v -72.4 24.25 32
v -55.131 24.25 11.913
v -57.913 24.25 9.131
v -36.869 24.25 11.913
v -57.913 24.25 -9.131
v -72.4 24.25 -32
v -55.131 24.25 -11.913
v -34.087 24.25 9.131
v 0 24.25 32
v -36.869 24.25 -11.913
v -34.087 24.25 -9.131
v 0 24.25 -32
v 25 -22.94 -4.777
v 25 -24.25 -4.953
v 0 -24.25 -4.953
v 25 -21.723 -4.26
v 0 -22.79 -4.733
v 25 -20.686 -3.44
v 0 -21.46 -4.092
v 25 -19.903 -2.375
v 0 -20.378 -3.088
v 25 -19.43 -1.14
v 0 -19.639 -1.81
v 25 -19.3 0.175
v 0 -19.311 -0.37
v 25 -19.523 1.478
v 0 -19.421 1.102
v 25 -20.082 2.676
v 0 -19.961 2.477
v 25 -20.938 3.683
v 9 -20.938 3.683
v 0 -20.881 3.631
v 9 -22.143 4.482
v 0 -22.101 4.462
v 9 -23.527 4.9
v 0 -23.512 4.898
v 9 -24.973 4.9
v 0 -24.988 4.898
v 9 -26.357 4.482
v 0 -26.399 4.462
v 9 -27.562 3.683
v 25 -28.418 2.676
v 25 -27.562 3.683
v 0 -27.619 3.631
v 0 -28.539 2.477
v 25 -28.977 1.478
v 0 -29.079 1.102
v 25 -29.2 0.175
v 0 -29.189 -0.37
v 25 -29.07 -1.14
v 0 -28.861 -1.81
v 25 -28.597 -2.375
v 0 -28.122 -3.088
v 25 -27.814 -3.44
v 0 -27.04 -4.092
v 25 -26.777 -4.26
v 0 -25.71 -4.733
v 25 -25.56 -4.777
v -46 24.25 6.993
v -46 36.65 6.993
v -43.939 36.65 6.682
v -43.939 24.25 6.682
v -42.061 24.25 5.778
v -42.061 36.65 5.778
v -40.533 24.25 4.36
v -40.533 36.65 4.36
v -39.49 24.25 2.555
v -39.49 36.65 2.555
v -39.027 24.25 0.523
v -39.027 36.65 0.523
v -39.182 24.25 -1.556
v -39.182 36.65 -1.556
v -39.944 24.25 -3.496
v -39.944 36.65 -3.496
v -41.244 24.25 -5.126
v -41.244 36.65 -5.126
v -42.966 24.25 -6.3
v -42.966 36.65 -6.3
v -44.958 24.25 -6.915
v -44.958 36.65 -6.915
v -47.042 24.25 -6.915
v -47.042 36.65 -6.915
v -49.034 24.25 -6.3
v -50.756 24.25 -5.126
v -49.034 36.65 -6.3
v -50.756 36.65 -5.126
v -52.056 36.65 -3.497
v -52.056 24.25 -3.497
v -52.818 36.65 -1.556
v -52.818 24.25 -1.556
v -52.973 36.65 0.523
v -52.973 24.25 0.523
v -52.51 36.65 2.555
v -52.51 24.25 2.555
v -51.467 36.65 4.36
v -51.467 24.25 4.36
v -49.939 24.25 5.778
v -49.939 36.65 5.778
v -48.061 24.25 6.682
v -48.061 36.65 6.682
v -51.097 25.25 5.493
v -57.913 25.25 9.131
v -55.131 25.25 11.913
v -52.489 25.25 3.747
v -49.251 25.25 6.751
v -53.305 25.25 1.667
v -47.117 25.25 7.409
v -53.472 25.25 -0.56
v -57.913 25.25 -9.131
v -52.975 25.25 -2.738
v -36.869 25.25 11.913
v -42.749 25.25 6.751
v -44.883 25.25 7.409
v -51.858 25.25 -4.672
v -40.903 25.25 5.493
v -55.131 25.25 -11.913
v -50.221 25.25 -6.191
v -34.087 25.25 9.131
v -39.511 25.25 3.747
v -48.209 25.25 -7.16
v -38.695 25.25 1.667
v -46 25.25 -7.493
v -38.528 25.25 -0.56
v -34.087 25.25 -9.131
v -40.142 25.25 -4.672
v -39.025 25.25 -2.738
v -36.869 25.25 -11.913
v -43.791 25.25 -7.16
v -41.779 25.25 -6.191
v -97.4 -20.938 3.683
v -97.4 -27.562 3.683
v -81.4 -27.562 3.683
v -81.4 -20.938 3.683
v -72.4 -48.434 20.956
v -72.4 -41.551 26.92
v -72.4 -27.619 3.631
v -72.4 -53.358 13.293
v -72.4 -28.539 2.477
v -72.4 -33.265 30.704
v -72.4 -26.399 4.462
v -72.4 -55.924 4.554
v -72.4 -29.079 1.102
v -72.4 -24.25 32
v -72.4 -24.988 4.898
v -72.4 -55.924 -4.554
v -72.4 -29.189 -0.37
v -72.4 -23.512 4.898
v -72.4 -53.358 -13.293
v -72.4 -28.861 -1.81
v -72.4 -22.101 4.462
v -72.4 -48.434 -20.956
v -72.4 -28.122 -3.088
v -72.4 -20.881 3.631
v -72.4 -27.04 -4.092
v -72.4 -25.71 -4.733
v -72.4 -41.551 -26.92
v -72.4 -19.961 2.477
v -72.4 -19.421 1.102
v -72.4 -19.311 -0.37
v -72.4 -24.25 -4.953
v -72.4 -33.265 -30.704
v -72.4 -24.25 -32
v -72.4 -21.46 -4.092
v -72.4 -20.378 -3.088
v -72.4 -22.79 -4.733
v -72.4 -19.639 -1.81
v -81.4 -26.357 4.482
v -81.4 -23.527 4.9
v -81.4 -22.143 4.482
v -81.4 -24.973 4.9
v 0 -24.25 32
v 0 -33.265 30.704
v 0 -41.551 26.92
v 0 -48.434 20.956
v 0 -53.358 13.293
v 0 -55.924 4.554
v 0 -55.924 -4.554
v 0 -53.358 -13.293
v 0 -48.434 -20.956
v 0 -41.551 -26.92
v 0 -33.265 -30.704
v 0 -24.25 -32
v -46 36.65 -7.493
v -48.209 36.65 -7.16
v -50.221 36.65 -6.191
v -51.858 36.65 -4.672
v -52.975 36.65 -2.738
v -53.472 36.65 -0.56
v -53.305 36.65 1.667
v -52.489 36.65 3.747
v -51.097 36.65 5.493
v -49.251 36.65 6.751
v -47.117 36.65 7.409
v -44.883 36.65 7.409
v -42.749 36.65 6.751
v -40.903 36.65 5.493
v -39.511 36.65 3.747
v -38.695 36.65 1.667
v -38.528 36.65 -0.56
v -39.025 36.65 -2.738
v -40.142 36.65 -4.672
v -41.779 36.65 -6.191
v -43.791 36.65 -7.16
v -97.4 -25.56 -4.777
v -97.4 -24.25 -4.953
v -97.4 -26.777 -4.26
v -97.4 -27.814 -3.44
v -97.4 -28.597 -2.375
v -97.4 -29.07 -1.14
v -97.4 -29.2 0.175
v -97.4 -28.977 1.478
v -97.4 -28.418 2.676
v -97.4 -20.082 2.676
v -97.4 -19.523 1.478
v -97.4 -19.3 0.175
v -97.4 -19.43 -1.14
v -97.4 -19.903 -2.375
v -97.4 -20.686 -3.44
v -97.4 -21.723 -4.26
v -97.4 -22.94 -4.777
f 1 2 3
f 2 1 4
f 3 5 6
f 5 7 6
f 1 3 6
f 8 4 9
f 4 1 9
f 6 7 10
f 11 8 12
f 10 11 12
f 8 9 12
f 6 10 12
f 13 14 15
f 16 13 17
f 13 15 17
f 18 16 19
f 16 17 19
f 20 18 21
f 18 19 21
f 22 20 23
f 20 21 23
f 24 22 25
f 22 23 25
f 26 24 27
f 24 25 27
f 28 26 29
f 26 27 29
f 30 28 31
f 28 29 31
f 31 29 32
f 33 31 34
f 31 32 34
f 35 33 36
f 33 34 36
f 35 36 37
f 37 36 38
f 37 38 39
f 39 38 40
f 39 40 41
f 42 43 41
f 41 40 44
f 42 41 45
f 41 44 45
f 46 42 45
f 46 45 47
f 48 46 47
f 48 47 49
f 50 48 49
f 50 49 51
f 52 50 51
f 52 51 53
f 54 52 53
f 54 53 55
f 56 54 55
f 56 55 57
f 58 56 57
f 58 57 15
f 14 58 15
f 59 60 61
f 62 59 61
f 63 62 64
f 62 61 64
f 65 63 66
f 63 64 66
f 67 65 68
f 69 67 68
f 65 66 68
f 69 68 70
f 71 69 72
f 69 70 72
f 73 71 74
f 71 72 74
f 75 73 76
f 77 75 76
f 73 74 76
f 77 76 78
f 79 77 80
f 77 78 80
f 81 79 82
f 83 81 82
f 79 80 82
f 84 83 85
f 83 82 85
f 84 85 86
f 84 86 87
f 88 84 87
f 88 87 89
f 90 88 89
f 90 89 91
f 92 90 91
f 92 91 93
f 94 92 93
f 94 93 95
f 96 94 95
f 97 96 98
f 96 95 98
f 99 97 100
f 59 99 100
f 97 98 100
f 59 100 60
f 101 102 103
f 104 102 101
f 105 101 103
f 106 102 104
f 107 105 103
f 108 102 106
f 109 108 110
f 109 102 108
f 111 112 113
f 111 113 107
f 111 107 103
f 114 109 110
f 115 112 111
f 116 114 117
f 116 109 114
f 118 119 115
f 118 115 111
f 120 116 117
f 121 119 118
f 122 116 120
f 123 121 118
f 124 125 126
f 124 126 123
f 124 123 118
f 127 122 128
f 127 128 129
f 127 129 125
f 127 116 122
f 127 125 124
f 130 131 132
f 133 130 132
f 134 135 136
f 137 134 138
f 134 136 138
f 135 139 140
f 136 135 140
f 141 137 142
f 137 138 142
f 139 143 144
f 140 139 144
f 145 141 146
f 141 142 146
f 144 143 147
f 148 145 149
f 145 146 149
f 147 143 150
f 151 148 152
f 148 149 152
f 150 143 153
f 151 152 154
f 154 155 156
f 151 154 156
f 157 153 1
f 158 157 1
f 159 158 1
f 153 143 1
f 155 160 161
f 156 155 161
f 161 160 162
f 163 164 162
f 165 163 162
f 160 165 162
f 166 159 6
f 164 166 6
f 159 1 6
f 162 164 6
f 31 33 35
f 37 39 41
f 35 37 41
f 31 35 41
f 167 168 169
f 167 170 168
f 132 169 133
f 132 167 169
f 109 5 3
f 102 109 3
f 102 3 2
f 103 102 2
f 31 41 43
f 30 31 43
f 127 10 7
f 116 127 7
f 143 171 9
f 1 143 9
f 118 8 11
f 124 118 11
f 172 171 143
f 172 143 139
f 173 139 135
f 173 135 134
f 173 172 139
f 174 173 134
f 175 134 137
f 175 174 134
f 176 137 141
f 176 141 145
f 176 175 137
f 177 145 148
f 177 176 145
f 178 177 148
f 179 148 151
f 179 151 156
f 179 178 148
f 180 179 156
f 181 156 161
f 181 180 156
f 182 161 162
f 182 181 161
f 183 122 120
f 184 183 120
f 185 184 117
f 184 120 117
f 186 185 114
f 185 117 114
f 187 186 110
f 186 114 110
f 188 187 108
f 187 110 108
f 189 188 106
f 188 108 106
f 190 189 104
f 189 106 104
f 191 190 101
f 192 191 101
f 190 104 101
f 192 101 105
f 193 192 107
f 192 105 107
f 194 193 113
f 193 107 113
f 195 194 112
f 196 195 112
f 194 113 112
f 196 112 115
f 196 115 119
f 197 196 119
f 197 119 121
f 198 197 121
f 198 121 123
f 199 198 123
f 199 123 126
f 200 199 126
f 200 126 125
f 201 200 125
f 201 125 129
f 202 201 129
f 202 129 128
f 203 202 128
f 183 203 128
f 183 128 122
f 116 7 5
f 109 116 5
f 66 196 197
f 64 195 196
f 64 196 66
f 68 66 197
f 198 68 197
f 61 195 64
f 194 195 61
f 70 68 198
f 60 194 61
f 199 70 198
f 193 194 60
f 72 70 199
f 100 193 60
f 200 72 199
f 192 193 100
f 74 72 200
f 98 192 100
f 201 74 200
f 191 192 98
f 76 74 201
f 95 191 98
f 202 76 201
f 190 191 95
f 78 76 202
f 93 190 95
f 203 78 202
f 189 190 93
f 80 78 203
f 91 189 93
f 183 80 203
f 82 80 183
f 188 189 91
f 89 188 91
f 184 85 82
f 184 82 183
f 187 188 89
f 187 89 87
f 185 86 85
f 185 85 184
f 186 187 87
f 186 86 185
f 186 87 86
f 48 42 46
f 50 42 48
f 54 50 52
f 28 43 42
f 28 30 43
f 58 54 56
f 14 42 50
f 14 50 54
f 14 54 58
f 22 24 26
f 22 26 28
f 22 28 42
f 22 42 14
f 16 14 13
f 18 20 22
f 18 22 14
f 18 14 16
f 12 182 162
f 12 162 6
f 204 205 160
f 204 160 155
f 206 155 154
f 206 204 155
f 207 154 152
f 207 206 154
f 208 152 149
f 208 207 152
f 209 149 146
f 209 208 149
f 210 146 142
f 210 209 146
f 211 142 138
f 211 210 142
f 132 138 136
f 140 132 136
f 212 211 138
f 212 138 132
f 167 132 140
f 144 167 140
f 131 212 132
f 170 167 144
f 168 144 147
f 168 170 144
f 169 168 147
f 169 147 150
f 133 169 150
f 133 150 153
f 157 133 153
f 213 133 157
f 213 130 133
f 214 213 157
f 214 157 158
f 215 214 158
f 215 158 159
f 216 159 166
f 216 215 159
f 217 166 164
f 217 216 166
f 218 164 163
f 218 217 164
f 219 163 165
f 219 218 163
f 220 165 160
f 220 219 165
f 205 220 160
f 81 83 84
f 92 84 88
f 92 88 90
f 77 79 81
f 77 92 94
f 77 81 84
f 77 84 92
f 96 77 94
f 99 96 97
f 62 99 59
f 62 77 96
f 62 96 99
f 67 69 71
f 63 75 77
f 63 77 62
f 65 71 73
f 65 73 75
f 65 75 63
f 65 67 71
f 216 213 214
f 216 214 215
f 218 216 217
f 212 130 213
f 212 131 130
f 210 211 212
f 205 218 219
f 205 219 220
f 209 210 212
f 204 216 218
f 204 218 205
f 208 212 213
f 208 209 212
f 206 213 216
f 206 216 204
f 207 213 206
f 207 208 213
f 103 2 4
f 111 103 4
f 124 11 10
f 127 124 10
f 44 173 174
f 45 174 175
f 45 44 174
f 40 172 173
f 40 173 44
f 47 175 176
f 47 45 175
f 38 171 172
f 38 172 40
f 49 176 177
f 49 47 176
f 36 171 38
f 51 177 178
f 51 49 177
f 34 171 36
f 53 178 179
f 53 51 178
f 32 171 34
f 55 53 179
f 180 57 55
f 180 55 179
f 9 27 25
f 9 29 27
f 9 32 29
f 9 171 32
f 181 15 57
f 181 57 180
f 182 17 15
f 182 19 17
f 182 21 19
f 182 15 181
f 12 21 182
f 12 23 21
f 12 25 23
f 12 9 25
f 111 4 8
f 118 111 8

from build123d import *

# Parameters (mm, degrees)
BOSS_EXTRUDE1_DEPTH     = 72.4
BOSS_EXTRUDE3_DEPTH     = 1
SKETCH3_4_R             = 7.493
BOSS_EXTRUDE4_DEPTH     = 12.4
SKETCH6_R               = 6.993
CUT_EXTRUDE1_DEPTH      = 12.4
SKETCH2_3_R             = 4.953
BOSS_EXTRUDE5_DEPTH     = 25
BOSS_EXTRUDE6_START     = 25
SKETCH7_R               = 4.953
BOSS_EXTRUDE6_DEPTH     = 25
CUT_EXTRUDE2_DEPTH      = 120.245838502
CUT_EXTRUDE2_DEPTH_BACK = 120.245838502
SKETCH8_W               = 16
SKETCH8_H               = 1.27


with BuildPart() as part:
    # Sketch2 → Boss-Extrude1 (new body)
    with BuildSketch(Plane(origin=(0, 0, 0), x_dir=(0, 0, -1), z_dir=(1, 0, 0))):
        with BuildLine():
            Line((32, -24.25), (32, 24.25))
            Line((32, 24.25), (-32, 24.25))
            Line((-32, 24.25), (-32, -24.25))
            ThreePointArc((-32, -24.25), (0, -56.25), (32, -24.25))
        make_face()
    extrude(amount=-BOSS_EXTRUDE1_DEPTH)

    # Sketch3 → Boss-Extrude3 (add)
    with BuildSketch(Plane(origin=(0, 24.25, 0), x_dir=(1, 0, 0), z_dir=(0, 1, 0))):
        Polygon((-57.9126, -9.1313), (-55.1313, -11.9126), (-36.8687, -11.9126), (-34.0874, -9.1313), (-34.0874, 9.1313), (-36.8687, 11.9126), (-55.1313, 11.9126), (-57.9126, 9.1313), align=None)
    extrude(amount=BOSS_EXTRUDE3_DEPTH)

    # Sketch3<4> → Boss-Extrude4 (add)
    with BuildSketch(Plane(origin=(0, 24.25, 0), x_dir=(1, 0, 0), z_dir=(0, 1, 0))):
        with Locations((-46, 0)):
            Circle(SKETCH3_4_R)
    extrude(amount=BOSS_EXTRUDE4_DEPTH)

    # Sketch6 → Cut-Extrude1 (cut)
    with BuildSketch(Plane(origin=(0, 36.65, 0), x_dir=(1, 0, 0), z_dir=(0, 1, 0))):
        with Locations((-46, 0)):
            Circle(SKETCH6_R)
    extrude(amount=-CUT_EXTRUDE1_DEPTH, mode=Mode.SUBTRACT)

    # Sketch2<3> → Boss-Extrude5 (add)
    with BuildSketch(Plane(origin=(0, 0, 0), x_dir=(0, 0, -1), z_dir=(1, 0, 0))):
        with Locations((0, -24.25)):
            Circle(SKETCH2_3_R)
    extrude(amount=BOSS_EXTRUDE5_DEPTH)

    # Sketch7 → Boss-Extrude6 (add)
    with BuildSketch(Plane.ZY.offset(72.4).offset(BOSS_EXTRUDE6_START)):
        with Locations((0, -24.25)):
            Circle(SKETCH7_R)
    extrude(amount=-BOSS_EXTRUDE6_DEPTH)

    # Sketch8 → Cut-Extrude2 (cut, two sides: drawn at the far end of the back side and taken through both)
    with BuildSketch(Plane(origin=(0, -24.25, 0), x_dir=(1, 0, 0), z_dir=(0, 1, 0)).offset(-CUT_EXTRUDE2_DEPTH_BACK)):
        with Locations((17, -4.318)):
            Rectangle(SKETCH8_W, SKETCH8_H)
        with Locations((-89.4, -4.318)):
            Rectangle(SKETCH8_W, SKETCH8_H)
    extrude(amount=CUT_EXTRUDE2_DEPTH + CUT_EXTRUDE2_DEPTH_BACK, mode=Mode.SUBTRACT)


solid = part.part
